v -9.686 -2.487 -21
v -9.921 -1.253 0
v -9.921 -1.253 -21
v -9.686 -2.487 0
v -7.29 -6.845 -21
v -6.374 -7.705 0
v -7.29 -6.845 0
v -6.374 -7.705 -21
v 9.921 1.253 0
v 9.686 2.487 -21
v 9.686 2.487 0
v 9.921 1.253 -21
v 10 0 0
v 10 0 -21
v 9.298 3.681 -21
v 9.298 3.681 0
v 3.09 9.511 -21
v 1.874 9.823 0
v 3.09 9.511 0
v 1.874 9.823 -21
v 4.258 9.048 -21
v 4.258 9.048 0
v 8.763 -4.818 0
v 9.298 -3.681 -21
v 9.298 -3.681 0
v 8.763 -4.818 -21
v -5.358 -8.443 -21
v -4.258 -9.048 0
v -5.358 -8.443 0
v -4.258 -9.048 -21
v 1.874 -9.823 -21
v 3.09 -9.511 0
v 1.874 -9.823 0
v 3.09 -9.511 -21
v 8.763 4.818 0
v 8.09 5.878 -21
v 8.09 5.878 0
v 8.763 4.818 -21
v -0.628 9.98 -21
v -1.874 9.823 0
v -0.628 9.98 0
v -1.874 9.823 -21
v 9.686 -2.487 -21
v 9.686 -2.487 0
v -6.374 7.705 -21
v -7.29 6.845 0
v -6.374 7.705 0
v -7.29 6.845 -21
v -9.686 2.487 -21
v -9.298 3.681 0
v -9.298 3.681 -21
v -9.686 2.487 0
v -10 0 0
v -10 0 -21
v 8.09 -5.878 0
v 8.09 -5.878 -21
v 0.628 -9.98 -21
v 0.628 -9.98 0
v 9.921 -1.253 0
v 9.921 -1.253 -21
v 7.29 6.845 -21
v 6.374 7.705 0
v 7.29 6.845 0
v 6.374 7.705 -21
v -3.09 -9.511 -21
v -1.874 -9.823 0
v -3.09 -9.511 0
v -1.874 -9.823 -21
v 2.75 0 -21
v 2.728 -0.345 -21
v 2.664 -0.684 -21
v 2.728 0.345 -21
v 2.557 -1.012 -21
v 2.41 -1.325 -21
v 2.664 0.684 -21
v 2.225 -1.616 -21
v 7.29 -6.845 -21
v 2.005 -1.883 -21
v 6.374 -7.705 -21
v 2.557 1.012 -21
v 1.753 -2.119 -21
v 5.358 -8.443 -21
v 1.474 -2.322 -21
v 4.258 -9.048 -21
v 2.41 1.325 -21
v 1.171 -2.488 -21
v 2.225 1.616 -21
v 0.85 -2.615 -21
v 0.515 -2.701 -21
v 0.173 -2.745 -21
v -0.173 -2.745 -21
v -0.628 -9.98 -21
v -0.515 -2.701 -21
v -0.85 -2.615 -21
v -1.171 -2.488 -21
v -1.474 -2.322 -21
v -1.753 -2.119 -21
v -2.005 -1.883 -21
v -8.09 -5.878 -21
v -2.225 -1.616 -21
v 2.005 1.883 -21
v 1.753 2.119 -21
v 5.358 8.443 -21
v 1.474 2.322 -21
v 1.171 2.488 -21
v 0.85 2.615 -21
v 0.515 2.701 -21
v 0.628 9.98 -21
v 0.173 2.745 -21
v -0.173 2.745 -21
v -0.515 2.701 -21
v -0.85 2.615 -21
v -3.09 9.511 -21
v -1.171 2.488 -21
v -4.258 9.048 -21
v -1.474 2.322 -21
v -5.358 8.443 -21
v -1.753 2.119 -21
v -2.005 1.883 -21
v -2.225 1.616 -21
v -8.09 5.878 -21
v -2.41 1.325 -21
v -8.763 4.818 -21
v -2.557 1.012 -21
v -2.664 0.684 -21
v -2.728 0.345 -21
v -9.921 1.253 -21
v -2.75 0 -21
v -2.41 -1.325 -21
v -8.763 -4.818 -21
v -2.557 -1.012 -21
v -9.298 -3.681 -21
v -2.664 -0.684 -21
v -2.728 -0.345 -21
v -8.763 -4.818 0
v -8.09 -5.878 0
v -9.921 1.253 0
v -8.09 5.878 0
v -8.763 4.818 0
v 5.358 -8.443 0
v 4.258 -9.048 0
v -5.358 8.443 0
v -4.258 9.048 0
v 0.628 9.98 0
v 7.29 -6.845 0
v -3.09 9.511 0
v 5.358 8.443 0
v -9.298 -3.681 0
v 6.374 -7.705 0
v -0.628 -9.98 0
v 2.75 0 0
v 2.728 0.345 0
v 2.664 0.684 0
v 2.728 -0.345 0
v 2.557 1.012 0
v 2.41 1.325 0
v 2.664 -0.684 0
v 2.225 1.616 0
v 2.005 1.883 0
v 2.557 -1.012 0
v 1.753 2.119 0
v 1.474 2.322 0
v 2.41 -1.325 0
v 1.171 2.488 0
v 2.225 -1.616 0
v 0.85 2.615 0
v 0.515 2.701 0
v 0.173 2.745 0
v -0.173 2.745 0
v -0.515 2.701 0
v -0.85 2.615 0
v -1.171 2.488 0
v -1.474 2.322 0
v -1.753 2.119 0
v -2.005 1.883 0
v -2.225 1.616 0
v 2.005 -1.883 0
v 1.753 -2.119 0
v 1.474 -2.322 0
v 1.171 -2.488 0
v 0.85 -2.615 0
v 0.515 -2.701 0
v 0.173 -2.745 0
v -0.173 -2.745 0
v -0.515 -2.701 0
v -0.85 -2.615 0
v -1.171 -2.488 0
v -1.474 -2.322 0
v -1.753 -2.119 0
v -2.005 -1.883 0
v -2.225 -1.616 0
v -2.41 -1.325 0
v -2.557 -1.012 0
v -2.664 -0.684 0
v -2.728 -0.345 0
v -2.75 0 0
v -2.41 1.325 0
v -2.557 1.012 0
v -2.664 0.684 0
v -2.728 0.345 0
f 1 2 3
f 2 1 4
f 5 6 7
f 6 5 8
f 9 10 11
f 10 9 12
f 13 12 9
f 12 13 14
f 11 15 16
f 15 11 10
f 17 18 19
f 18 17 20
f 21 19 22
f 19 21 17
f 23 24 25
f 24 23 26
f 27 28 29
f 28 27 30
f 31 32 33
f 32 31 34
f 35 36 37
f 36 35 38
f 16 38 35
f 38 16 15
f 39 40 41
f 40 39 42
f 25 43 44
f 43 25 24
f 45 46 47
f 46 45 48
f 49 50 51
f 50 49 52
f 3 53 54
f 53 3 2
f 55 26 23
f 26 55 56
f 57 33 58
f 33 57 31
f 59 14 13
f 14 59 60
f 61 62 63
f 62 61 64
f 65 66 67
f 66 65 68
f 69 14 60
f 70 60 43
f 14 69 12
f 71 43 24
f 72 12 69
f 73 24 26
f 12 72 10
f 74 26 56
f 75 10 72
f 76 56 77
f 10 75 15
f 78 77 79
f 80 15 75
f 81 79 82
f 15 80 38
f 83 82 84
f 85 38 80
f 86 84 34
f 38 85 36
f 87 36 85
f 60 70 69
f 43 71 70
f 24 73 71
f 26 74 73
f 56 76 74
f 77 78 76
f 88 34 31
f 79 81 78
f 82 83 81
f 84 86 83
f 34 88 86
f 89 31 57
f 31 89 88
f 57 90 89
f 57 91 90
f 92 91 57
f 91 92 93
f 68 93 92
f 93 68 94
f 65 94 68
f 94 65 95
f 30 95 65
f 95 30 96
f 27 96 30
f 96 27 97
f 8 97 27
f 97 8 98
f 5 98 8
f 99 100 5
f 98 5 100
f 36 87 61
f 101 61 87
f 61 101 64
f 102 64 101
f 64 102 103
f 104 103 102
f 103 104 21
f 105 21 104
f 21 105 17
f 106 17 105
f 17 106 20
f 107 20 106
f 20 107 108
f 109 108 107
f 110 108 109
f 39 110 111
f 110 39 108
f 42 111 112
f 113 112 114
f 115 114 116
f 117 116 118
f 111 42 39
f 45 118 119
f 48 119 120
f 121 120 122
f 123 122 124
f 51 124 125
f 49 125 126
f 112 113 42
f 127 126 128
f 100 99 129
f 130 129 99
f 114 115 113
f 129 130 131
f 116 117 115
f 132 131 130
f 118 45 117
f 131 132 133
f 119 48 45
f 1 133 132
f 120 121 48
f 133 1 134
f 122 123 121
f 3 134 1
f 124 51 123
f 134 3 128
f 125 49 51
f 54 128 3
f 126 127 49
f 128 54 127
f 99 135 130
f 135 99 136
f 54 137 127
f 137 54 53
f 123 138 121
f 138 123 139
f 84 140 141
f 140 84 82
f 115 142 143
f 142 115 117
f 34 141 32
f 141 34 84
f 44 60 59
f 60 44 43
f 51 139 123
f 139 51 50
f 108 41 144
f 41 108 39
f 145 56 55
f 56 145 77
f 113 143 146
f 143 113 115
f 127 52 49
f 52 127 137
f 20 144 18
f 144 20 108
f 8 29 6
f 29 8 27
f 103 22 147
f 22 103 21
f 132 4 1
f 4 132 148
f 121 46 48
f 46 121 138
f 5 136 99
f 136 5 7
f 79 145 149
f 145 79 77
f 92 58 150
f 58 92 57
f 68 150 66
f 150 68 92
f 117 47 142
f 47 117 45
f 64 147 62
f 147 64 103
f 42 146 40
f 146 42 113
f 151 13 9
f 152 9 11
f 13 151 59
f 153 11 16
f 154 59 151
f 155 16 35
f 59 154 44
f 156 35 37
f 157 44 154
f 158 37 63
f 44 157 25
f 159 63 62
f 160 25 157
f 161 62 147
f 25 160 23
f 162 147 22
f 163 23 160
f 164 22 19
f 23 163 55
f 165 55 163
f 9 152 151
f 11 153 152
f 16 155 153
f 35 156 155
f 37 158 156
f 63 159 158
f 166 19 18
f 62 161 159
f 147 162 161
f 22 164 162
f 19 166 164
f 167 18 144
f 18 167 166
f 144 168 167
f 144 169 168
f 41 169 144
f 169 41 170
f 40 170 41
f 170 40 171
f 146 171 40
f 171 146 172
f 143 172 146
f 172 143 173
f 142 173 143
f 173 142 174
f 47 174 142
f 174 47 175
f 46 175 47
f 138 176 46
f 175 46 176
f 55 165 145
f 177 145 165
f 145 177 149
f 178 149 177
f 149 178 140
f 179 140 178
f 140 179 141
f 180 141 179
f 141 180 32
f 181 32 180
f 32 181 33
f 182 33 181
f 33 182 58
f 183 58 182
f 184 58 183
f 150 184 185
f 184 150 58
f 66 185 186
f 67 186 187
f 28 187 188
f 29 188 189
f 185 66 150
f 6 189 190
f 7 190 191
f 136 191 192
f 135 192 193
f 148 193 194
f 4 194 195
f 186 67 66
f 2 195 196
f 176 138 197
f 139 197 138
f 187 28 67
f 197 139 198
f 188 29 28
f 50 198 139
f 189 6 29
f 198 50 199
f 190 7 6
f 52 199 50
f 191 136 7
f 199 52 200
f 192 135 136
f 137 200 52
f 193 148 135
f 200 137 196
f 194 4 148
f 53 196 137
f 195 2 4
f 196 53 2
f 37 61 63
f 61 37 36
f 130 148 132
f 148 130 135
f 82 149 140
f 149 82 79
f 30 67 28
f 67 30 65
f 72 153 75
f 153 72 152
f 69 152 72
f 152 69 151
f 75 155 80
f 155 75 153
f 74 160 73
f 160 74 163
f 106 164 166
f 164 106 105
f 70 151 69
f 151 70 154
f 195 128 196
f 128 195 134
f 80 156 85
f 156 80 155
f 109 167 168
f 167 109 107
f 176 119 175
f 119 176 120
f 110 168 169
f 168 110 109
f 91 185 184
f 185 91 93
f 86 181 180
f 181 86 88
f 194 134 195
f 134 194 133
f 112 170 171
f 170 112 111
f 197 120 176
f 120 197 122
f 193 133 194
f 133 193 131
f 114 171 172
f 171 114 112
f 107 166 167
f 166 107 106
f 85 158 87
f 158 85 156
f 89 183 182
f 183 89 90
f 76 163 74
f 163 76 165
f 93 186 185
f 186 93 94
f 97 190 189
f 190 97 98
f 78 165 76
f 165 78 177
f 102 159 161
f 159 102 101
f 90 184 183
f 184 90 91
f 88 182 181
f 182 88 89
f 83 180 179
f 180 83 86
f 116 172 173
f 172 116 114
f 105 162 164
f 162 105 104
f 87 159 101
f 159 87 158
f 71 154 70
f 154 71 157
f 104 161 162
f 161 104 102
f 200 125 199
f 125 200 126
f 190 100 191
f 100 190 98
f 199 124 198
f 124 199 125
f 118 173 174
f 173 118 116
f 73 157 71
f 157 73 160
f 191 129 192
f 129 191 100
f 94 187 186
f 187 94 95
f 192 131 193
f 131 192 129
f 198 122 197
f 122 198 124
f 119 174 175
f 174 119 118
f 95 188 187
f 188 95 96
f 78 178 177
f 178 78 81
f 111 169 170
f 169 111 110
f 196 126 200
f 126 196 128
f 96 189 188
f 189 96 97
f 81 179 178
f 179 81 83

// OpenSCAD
$fn = 50;


difference() {
	union() {
		translate(v = [0, 0, -21.0000000000]) {
			cylinder(h = 21, r = 10.0000000000);
		}
	}
	union() {
		#translate(v = [0, 0, -21]) {
			cylinder(h = 21, r = 2.7500000000);
		}
	}
}
